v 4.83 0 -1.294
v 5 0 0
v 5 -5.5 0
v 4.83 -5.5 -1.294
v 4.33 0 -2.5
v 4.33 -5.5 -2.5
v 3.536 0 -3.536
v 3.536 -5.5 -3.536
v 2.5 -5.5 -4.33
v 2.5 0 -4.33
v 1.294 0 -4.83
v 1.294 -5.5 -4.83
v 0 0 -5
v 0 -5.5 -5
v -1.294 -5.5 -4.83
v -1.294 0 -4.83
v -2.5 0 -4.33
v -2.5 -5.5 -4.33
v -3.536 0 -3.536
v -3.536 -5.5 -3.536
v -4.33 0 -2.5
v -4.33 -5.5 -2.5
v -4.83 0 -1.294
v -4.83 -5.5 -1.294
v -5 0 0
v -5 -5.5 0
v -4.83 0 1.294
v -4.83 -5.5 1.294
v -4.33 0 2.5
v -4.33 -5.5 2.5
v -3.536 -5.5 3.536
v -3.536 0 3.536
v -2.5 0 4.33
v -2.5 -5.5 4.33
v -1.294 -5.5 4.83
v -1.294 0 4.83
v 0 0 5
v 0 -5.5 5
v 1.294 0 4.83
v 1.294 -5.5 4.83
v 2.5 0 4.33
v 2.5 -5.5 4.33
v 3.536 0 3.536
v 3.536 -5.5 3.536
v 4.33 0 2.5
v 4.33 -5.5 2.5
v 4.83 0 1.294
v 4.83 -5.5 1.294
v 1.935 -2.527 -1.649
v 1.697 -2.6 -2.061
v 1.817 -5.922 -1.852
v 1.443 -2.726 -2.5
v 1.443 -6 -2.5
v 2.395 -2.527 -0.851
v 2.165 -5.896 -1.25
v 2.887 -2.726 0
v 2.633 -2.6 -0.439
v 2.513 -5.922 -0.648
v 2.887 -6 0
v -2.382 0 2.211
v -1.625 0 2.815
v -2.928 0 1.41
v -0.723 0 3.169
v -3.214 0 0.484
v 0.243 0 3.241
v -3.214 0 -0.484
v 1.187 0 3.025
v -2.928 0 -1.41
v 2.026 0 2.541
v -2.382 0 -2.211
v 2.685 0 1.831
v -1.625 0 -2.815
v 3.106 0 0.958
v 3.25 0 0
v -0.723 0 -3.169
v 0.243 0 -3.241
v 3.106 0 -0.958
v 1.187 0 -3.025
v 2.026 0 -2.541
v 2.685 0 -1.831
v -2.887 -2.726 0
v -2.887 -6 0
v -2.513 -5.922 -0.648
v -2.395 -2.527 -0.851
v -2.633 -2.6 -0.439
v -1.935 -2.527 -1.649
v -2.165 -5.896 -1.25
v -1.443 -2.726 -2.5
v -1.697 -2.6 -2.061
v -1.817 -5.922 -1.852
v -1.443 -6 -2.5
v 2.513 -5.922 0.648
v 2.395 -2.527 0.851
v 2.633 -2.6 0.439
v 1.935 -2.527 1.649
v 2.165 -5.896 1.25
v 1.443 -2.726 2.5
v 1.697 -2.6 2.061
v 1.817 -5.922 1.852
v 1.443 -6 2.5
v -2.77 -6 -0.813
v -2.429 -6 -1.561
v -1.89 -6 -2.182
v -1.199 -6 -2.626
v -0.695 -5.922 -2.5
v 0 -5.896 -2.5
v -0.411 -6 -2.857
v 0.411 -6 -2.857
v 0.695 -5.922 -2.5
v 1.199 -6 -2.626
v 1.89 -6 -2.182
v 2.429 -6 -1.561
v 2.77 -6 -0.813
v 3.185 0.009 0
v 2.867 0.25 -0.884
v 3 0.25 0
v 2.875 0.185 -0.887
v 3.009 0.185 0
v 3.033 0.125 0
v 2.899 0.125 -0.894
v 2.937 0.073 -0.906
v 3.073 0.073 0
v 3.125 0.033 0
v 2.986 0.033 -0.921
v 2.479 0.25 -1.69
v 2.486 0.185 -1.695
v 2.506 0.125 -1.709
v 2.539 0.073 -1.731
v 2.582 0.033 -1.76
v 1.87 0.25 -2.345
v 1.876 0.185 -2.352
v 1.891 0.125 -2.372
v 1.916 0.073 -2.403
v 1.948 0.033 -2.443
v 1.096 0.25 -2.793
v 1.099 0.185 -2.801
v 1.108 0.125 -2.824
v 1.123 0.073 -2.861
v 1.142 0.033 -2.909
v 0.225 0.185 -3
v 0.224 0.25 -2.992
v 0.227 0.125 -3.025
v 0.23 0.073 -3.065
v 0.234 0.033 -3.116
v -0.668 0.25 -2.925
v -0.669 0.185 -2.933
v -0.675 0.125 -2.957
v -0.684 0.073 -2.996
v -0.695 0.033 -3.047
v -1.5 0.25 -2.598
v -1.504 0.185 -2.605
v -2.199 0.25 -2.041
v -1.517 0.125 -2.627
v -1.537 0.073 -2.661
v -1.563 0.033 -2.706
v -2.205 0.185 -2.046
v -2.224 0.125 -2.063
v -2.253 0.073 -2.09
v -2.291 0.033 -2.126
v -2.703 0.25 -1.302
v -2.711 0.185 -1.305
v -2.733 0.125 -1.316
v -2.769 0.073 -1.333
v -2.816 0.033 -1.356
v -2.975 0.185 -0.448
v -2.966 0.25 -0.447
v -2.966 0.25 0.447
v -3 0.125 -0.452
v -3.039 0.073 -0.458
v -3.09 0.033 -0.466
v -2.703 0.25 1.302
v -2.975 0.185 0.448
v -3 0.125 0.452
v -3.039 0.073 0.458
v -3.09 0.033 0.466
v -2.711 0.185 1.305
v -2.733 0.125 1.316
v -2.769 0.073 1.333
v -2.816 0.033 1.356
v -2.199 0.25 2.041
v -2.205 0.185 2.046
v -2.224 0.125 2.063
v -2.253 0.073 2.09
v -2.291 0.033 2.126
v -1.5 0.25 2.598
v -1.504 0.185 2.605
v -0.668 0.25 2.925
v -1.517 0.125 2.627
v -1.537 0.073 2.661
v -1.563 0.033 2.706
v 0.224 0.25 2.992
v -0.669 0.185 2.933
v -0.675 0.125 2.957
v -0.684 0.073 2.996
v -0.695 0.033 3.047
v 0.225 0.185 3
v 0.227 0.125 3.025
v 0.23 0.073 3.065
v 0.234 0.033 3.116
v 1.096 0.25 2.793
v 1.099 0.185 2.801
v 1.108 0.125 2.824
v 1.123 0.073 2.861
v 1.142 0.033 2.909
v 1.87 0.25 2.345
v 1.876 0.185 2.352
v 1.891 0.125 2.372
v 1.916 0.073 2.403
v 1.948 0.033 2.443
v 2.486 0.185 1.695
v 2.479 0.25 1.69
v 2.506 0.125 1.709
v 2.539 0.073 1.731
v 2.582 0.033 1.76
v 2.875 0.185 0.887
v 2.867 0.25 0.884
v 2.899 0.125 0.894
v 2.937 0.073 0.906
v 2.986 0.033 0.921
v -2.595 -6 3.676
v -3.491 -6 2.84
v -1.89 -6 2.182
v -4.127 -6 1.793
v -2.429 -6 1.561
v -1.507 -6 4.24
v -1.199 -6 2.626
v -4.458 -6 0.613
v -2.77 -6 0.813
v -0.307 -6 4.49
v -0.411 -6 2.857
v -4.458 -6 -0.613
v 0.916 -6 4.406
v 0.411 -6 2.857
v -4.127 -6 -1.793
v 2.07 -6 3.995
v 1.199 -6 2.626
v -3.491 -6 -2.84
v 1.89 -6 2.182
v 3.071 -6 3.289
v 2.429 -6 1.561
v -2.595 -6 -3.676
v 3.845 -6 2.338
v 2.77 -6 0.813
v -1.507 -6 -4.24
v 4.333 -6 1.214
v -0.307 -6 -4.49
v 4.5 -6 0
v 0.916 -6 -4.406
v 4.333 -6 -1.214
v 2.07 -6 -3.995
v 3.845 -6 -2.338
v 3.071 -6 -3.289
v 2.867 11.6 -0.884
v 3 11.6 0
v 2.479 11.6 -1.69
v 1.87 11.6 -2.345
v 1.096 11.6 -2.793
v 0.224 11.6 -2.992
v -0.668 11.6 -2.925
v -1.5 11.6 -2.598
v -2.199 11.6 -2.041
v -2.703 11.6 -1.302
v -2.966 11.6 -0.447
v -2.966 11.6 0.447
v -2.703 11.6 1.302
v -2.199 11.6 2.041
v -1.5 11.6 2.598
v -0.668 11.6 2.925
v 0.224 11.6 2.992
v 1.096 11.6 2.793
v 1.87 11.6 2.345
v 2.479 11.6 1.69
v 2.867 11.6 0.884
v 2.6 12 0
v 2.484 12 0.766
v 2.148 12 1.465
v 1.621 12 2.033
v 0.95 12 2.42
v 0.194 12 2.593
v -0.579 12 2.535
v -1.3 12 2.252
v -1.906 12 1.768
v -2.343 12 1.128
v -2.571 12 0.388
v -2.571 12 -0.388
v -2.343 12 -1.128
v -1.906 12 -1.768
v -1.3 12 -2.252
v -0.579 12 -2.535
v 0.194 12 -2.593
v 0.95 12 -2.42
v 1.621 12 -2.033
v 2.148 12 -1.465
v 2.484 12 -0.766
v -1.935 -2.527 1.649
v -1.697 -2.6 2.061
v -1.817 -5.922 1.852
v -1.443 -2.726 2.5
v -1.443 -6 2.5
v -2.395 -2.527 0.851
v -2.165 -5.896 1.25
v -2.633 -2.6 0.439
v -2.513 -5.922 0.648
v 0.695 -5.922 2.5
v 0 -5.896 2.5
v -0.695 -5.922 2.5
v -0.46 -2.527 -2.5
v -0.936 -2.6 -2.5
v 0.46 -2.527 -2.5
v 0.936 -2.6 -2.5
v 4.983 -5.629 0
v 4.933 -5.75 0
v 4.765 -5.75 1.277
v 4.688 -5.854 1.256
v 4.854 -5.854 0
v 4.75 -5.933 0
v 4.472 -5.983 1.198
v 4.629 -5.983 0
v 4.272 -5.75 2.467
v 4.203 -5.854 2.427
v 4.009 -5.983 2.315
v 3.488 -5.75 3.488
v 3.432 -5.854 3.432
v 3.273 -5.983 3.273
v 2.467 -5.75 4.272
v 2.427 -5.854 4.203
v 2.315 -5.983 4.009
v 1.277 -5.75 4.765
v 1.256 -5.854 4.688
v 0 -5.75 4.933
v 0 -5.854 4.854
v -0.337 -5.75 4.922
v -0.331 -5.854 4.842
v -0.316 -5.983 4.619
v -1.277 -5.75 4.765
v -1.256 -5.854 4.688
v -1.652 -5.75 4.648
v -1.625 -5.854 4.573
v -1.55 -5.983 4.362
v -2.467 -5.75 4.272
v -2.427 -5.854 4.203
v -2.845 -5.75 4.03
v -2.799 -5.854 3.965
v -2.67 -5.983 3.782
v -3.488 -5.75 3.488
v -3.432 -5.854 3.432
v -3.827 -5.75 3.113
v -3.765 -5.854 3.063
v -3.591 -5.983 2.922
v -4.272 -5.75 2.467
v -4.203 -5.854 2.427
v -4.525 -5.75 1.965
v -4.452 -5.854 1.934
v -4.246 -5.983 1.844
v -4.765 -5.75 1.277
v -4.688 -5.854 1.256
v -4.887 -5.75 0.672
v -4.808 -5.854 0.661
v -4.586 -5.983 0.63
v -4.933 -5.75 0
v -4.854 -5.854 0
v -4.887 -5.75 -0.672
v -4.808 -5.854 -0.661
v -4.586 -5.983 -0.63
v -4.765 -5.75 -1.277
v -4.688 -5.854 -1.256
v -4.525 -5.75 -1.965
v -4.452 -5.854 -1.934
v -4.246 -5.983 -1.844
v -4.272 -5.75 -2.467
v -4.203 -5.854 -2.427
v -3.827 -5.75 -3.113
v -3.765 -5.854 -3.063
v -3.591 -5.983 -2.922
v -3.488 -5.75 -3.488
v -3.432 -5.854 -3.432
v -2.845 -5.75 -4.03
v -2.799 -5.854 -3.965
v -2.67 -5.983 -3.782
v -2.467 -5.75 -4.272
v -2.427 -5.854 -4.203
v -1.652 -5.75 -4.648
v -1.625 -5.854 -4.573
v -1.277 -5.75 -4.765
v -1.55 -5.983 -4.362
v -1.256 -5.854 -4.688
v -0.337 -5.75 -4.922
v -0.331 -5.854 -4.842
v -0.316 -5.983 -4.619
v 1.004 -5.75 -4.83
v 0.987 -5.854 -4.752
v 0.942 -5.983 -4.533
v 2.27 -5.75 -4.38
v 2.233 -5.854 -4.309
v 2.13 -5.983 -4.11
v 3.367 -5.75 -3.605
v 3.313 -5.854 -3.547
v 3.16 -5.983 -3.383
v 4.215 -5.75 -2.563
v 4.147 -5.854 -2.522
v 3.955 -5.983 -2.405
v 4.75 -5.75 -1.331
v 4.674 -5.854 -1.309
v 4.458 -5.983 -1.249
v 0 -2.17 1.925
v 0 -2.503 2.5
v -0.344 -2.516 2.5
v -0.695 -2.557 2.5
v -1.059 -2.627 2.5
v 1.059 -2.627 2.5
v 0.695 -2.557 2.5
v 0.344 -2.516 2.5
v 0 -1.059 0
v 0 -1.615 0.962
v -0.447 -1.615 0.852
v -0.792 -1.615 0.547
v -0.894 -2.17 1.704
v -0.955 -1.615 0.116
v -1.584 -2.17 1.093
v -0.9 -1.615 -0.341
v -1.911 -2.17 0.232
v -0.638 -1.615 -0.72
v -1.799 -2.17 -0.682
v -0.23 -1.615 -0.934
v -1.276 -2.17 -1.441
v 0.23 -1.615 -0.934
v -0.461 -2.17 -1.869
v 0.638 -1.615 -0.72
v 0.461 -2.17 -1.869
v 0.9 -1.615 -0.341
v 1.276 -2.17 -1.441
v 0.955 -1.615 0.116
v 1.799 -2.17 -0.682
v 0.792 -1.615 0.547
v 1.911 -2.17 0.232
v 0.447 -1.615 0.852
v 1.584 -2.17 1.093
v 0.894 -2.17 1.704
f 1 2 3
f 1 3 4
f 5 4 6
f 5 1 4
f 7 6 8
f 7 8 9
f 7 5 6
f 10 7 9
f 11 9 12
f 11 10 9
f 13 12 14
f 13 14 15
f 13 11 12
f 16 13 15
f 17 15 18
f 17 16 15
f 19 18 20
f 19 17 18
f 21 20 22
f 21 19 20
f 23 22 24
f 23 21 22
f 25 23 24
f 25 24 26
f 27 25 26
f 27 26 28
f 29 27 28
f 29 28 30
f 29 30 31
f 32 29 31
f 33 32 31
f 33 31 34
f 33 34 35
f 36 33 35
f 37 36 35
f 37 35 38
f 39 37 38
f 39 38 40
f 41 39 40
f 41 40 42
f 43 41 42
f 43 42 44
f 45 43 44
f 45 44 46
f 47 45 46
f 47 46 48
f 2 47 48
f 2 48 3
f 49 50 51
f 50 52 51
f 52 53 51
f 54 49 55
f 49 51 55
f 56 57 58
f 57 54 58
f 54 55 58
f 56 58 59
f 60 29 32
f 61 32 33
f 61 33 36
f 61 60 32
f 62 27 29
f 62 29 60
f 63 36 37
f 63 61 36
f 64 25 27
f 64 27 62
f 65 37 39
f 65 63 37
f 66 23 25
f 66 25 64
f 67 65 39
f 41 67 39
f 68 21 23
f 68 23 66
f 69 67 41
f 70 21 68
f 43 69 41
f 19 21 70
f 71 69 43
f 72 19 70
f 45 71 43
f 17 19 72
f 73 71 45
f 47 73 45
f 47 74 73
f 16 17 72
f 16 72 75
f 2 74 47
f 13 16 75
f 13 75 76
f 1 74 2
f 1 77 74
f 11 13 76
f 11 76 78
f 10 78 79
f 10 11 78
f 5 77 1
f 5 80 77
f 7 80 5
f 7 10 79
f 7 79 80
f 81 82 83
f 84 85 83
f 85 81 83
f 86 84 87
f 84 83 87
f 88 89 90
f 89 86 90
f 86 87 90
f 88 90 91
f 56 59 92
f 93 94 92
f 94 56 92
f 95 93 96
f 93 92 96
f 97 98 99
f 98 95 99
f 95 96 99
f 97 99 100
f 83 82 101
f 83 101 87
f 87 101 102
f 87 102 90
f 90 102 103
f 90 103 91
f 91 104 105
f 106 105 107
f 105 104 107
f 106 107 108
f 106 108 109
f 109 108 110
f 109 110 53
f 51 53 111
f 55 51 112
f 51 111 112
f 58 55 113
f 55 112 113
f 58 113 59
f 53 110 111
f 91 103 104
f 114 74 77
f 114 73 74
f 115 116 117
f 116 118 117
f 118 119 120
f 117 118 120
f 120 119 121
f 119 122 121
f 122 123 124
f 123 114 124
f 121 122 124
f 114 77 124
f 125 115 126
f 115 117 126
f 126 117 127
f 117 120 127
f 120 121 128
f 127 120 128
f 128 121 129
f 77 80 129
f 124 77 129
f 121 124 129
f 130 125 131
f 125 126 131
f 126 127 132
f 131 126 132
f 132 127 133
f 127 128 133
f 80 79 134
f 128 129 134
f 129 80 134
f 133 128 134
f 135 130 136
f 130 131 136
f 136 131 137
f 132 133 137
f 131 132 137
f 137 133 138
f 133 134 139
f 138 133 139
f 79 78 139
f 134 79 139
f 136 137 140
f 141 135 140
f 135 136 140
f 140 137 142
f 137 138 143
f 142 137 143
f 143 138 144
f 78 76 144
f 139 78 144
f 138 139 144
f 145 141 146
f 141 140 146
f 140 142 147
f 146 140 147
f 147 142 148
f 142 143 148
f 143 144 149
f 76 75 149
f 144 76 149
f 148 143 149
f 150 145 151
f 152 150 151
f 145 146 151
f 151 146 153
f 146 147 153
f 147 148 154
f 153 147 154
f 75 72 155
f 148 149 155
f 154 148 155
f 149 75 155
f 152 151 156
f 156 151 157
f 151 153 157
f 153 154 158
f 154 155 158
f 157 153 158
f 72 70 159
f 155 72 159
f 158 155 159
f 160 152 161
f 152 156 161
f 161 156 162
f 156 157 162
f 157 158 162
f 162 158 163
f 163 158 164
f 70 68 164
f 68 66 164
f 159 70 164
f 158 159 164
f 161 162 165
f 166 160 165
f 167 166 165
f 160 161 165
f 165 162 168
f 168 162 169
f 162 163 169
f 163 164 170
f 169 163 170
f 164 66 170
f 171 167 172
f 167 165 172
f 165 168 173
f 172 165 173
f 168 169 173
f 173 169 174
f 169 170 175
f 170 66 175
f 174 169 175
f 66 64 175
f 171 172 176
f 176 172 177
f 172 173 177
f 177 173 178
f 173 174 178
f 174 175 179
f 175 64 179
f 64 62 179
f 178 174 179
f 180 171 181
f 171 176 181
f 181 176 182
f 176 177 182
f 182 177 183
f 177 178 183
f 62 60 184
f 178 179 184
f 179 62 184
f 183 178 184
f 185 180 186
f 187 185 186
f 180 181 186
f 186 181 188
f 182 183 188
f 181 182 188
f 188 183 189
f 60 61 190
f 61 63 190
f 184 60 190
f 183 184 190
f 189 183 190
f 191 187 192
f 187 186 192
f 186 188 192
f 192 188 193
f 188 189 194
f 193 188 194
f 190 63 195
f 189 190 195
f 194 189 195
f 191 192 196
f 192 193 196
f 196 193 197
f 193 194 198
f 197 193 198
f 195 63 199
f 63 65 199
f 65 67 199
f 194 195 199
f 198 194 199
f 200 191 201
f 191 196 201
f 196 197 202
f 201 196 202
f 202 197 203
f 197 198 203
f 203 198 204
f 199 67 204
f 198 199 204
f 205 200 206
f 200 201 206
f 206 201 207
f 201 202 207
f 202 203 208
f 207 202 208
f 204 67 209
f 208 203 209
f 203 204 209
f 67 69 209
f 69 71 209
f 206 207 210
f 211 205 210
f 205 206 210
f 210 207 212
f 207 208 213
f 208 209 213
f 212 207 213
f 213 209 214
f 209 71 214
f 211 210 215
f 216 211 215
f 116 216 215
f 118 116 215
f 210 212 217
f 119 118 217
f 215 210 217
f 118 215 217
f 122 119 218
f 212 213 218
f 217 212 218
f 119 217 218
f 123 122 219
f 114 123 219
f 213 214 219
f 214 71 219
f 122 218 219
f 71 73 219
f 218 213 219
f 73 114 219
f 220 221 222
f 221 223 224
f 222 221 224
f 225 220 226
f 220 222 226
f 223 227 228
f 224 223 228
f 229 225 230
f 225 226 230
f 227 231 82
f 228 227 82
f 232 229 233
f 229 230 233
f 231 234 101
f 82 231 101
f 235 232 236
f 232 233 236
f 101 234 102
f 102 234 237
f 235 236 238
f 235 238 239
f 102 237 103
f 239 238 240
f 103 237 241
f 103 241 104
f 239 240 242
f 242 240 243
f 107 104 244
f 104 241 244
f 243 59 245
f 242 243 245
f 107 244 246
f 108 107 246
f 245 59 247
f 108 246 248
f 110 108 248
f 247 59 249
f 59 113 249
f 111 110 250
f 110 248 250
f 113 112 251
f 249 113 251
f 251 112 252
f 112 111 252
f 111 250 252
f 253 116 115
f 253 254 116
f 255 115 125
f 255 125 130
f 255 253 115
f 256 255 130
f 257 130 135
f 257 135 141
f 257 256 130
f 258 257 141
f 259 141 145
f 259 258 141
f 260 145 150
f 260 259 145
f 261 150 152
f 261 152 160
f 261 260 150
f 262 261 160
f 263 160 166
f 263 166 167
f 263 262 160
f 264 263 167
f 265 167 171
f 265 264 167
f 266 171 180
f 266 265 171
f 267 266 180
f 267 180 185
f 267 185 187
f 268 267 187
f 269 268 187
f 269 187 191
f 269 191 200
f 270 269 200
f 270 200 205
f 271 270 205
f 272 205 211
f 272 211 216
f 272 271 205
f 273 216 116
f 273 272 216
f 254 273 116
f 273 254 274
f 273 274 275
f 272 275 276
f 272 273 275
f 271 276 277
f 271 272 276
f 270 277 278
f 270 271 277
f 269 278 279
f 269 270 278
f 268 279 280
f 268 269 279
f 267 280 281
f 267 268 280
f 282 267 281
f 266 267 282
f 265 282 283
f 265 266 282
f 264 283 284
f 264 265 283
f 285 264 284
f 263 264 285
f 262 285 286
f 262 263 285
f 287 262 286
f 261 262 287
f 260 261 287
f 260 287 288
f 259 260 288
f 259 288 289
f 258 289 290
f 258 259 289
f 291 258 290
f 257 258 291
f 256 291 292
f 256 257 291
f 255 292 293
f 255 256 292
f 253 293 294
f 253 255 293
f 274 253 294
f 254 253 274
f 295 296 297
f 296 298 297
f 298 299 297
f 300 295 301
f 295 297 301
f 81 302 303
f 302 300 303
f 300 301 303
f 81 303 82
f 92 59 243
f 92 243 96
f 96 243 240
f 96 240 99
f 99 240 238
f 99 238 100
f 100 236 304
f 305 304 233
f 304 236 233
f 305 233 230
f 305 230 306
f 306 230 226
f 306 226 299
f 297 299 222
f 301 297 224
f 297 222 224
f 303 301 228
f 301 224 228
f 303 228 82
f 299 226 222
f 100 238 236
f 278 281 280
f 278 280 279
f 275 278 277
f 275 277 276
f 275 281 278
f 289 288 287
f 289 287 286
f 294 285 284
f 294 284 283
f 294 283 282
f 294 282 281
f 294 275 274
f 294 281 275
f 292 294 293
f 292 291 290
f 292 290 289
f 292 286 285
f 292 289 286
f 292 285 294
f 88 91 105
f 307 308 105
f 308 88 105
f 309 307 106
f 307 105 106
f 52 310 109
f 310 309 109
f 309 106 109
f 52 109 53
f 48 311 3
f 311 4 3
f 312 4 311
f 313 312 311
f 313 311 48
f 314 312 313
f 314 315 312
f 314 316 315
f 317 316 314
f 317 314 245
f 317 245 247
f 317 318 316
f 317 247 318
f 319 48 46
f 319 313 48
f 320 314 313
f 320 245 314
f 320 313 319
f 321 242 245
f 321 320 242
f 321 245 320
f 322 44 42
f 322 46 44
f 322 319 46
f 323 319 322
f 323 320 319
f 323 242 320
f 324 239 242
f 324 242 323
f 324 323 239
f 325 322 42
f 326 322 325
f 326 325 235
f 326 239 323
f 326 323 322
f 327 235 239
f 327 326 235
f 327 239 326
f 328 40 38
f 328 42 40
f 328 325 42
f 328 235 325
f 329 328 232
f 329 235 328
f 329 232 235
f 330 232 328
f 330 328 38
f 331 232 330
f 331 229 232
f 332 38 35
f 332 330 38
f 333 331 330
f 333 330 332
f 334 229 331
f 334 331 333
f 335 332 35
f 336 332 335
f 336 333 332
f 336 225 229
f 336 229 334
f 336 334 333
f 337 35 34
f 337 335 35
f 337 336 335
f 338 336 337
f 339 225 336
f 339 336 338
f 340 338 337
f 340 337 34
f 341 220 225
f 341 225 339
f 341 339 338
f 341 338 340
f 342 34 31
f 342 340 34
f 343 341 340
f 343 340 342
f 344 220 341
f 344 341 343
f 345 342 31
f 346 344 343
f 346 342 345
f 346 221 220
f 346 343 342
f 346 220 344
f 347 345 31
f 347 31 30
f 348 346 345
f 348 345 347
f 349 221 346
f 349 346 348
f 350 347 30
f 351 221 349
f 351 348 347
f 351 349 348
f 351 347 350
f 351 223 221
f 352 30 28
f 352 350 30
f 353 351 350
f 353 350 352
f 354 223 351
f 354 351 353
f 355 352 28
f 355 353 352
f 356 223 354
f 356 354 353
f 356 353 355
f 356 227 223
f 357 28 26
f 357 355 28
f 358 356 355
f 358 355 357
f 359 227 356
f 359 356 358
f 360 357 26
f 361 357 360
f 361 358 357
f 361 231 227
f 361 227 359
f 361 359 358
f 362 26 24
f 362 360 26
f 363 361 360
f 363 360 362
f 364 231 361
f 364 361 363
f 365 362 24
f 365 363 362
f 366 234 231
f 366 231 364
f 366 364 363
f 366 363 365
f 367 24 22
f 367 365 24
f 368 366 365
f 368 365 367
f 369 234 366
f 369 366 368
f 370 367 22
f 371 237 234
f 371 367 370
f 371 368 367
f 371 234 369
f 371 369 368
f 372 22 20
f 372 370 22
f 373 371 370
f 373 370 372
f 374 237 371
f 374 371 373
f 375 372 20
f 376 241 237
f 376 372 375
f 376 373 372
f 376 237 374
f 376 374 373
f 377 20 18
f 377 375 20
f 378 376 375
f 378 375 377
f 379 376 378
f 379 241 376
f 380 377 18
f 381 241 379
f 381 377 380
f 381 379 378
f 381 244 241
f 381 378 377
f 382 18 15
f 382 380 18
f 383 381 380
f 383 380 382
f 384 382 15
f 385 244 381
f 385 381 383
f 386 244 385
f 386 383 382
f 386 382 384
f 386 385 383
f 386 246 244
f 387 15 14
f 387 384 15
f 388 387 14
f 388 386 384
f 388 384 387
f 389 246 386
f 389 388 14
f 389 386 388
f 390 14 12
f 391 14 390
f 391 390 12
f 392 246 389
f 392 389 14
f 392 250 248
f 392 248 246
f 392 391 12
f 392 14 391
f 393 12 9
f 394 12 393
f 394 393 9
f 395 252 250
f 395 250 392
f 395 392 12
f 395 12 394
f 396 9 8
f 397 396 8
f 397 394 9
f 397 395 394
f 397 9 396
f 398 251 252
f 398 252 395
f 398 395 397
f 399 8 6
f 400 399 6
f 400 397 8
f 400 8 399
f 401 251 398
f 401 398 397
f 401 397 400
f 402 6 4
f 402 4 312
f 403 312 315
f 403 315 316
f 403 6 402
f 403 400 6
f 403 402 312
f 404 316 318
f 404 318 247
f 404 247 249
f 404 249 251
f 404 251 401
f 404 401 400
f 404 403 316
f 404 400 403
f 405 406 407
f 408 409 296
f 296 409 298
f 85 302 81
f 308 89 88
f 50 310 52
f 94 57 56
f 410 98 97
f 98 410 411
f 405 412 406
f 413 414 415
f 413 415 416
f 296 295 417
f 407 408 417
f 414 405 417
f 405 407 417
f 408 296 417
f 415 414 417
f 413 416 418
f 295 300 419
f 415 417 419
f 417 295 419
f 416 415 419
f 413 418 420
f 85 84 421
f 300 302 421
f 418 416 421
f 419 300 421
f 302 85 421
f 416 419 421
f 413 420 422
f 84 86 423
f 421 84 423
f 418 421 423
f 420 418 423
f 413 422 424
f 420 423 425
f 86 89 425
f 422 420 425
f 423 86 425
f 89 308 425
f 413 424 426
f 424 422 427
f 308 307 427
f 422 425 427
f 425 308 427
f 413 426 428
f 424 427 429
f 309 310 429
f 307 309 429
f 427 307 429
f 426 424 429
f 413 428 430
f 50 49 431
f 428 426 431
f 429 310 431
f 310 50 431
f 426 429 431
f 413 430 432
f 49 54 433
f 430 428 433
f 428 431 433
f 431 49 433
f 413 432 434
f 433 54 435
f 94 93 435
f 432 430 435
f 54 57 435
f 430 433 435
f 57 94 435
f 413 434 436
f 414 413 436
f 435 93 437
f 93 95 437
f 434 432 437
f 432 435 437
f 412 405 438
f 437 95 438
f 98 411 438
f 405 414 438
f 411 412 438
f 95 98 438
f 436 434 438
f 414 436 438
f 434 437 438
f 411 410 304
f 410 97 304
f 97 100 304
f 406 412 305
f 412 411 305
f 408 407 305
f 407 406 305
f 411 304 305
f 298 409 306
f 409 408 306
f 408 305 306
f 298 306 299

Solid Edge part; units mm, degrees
sketch "Sketch1" plane through (0, 0, 0) normal (0, 0, 1) x (1, 0, 0)
  line L0 (3, 0) -> (3, 12)
  line L1 (0, 12) -> (3, 12)
  line L2 (0, 0) -> (0, 12)
  line L3 (0, 0) -> (0, -6)
  line L4 (0, -6) -> (5, -6)
  line L5 (5, -6) -> (5, 0)
  line L6 (5, 0) -> (3, 0)
revolve "RevolvedProtrusion1" add sketch "Sketch1" angle 360 about axis through (0, 0, 0) along (0, 1, 0)
sketch "Sketch2" plane through (0, 0, 0) normal (1, 0, 0) x (0, 1, 0)
  line L0 (-6, 3.3615) -> (-3, 3.3615)
  line L1 (-1.0592, 0) -> (-3, 3.3615)
  line L2 (-6, 0) -> (-1.0592, 0)
  line L3 (-6, 0) -> (-6, 3.3615)
revolve "RevolvedCutout1" cut sketch "Sketch2" angle 360 about axis through (0, -4.5, 0) along (0, 1, 0)
sketch "Sketch3" plane through (0, -6, 0) normal (0, -1, 0) x (0, 0, 1)
  circle A0 centre (0, 0) radius 3.3615
  line L0 (-2.5, -1.4434) -> (0, -2.8868)
  line L1 (0, -2.8868) -> (2.5, -1.4434)
  line L2 (2.5, -1.4434) -> (2.5, 1.4434)
  line L3 (2.5, 1.4434) -> (0, 2.8868)
  line L4 (0, 2.8868) -> (-2.5, 1.4434)
  line L5 (-2.5, 1.4434) -> (-2.5, -1.4434)
  dimension "D1" = 5
extrude "Protrusion1" add sketch "Sketch3" against normal up to next
sketch "Sketch4" plane through (0, 0, 0) normal (0, 0, 1) x (1, 0, 0)
  line L0 (-2.8868, -6) -> (0, -6)
  line L1 (0, -6) -> (0, -5.2265)
  line L2 (0, -5.2265) -> (-2.8868, -6)
revolve "RevolvedCutout2" cut sketch "Sketch4" angle 360 about axis through (0, -4.5, 0) along (0, 1, 0)
fillet "Round1" radius 0.25 1 edges at (0, 0, -3)
fillet "Round2" radius 0.5 1 edges at (0, -6, -5)
chamfer "倒斜角_2" distance 0.4 angle 45 1 edges at (0, 12, -3)
cosmetic_thread "螺纹_3" size "M6" thread depth 9.6
